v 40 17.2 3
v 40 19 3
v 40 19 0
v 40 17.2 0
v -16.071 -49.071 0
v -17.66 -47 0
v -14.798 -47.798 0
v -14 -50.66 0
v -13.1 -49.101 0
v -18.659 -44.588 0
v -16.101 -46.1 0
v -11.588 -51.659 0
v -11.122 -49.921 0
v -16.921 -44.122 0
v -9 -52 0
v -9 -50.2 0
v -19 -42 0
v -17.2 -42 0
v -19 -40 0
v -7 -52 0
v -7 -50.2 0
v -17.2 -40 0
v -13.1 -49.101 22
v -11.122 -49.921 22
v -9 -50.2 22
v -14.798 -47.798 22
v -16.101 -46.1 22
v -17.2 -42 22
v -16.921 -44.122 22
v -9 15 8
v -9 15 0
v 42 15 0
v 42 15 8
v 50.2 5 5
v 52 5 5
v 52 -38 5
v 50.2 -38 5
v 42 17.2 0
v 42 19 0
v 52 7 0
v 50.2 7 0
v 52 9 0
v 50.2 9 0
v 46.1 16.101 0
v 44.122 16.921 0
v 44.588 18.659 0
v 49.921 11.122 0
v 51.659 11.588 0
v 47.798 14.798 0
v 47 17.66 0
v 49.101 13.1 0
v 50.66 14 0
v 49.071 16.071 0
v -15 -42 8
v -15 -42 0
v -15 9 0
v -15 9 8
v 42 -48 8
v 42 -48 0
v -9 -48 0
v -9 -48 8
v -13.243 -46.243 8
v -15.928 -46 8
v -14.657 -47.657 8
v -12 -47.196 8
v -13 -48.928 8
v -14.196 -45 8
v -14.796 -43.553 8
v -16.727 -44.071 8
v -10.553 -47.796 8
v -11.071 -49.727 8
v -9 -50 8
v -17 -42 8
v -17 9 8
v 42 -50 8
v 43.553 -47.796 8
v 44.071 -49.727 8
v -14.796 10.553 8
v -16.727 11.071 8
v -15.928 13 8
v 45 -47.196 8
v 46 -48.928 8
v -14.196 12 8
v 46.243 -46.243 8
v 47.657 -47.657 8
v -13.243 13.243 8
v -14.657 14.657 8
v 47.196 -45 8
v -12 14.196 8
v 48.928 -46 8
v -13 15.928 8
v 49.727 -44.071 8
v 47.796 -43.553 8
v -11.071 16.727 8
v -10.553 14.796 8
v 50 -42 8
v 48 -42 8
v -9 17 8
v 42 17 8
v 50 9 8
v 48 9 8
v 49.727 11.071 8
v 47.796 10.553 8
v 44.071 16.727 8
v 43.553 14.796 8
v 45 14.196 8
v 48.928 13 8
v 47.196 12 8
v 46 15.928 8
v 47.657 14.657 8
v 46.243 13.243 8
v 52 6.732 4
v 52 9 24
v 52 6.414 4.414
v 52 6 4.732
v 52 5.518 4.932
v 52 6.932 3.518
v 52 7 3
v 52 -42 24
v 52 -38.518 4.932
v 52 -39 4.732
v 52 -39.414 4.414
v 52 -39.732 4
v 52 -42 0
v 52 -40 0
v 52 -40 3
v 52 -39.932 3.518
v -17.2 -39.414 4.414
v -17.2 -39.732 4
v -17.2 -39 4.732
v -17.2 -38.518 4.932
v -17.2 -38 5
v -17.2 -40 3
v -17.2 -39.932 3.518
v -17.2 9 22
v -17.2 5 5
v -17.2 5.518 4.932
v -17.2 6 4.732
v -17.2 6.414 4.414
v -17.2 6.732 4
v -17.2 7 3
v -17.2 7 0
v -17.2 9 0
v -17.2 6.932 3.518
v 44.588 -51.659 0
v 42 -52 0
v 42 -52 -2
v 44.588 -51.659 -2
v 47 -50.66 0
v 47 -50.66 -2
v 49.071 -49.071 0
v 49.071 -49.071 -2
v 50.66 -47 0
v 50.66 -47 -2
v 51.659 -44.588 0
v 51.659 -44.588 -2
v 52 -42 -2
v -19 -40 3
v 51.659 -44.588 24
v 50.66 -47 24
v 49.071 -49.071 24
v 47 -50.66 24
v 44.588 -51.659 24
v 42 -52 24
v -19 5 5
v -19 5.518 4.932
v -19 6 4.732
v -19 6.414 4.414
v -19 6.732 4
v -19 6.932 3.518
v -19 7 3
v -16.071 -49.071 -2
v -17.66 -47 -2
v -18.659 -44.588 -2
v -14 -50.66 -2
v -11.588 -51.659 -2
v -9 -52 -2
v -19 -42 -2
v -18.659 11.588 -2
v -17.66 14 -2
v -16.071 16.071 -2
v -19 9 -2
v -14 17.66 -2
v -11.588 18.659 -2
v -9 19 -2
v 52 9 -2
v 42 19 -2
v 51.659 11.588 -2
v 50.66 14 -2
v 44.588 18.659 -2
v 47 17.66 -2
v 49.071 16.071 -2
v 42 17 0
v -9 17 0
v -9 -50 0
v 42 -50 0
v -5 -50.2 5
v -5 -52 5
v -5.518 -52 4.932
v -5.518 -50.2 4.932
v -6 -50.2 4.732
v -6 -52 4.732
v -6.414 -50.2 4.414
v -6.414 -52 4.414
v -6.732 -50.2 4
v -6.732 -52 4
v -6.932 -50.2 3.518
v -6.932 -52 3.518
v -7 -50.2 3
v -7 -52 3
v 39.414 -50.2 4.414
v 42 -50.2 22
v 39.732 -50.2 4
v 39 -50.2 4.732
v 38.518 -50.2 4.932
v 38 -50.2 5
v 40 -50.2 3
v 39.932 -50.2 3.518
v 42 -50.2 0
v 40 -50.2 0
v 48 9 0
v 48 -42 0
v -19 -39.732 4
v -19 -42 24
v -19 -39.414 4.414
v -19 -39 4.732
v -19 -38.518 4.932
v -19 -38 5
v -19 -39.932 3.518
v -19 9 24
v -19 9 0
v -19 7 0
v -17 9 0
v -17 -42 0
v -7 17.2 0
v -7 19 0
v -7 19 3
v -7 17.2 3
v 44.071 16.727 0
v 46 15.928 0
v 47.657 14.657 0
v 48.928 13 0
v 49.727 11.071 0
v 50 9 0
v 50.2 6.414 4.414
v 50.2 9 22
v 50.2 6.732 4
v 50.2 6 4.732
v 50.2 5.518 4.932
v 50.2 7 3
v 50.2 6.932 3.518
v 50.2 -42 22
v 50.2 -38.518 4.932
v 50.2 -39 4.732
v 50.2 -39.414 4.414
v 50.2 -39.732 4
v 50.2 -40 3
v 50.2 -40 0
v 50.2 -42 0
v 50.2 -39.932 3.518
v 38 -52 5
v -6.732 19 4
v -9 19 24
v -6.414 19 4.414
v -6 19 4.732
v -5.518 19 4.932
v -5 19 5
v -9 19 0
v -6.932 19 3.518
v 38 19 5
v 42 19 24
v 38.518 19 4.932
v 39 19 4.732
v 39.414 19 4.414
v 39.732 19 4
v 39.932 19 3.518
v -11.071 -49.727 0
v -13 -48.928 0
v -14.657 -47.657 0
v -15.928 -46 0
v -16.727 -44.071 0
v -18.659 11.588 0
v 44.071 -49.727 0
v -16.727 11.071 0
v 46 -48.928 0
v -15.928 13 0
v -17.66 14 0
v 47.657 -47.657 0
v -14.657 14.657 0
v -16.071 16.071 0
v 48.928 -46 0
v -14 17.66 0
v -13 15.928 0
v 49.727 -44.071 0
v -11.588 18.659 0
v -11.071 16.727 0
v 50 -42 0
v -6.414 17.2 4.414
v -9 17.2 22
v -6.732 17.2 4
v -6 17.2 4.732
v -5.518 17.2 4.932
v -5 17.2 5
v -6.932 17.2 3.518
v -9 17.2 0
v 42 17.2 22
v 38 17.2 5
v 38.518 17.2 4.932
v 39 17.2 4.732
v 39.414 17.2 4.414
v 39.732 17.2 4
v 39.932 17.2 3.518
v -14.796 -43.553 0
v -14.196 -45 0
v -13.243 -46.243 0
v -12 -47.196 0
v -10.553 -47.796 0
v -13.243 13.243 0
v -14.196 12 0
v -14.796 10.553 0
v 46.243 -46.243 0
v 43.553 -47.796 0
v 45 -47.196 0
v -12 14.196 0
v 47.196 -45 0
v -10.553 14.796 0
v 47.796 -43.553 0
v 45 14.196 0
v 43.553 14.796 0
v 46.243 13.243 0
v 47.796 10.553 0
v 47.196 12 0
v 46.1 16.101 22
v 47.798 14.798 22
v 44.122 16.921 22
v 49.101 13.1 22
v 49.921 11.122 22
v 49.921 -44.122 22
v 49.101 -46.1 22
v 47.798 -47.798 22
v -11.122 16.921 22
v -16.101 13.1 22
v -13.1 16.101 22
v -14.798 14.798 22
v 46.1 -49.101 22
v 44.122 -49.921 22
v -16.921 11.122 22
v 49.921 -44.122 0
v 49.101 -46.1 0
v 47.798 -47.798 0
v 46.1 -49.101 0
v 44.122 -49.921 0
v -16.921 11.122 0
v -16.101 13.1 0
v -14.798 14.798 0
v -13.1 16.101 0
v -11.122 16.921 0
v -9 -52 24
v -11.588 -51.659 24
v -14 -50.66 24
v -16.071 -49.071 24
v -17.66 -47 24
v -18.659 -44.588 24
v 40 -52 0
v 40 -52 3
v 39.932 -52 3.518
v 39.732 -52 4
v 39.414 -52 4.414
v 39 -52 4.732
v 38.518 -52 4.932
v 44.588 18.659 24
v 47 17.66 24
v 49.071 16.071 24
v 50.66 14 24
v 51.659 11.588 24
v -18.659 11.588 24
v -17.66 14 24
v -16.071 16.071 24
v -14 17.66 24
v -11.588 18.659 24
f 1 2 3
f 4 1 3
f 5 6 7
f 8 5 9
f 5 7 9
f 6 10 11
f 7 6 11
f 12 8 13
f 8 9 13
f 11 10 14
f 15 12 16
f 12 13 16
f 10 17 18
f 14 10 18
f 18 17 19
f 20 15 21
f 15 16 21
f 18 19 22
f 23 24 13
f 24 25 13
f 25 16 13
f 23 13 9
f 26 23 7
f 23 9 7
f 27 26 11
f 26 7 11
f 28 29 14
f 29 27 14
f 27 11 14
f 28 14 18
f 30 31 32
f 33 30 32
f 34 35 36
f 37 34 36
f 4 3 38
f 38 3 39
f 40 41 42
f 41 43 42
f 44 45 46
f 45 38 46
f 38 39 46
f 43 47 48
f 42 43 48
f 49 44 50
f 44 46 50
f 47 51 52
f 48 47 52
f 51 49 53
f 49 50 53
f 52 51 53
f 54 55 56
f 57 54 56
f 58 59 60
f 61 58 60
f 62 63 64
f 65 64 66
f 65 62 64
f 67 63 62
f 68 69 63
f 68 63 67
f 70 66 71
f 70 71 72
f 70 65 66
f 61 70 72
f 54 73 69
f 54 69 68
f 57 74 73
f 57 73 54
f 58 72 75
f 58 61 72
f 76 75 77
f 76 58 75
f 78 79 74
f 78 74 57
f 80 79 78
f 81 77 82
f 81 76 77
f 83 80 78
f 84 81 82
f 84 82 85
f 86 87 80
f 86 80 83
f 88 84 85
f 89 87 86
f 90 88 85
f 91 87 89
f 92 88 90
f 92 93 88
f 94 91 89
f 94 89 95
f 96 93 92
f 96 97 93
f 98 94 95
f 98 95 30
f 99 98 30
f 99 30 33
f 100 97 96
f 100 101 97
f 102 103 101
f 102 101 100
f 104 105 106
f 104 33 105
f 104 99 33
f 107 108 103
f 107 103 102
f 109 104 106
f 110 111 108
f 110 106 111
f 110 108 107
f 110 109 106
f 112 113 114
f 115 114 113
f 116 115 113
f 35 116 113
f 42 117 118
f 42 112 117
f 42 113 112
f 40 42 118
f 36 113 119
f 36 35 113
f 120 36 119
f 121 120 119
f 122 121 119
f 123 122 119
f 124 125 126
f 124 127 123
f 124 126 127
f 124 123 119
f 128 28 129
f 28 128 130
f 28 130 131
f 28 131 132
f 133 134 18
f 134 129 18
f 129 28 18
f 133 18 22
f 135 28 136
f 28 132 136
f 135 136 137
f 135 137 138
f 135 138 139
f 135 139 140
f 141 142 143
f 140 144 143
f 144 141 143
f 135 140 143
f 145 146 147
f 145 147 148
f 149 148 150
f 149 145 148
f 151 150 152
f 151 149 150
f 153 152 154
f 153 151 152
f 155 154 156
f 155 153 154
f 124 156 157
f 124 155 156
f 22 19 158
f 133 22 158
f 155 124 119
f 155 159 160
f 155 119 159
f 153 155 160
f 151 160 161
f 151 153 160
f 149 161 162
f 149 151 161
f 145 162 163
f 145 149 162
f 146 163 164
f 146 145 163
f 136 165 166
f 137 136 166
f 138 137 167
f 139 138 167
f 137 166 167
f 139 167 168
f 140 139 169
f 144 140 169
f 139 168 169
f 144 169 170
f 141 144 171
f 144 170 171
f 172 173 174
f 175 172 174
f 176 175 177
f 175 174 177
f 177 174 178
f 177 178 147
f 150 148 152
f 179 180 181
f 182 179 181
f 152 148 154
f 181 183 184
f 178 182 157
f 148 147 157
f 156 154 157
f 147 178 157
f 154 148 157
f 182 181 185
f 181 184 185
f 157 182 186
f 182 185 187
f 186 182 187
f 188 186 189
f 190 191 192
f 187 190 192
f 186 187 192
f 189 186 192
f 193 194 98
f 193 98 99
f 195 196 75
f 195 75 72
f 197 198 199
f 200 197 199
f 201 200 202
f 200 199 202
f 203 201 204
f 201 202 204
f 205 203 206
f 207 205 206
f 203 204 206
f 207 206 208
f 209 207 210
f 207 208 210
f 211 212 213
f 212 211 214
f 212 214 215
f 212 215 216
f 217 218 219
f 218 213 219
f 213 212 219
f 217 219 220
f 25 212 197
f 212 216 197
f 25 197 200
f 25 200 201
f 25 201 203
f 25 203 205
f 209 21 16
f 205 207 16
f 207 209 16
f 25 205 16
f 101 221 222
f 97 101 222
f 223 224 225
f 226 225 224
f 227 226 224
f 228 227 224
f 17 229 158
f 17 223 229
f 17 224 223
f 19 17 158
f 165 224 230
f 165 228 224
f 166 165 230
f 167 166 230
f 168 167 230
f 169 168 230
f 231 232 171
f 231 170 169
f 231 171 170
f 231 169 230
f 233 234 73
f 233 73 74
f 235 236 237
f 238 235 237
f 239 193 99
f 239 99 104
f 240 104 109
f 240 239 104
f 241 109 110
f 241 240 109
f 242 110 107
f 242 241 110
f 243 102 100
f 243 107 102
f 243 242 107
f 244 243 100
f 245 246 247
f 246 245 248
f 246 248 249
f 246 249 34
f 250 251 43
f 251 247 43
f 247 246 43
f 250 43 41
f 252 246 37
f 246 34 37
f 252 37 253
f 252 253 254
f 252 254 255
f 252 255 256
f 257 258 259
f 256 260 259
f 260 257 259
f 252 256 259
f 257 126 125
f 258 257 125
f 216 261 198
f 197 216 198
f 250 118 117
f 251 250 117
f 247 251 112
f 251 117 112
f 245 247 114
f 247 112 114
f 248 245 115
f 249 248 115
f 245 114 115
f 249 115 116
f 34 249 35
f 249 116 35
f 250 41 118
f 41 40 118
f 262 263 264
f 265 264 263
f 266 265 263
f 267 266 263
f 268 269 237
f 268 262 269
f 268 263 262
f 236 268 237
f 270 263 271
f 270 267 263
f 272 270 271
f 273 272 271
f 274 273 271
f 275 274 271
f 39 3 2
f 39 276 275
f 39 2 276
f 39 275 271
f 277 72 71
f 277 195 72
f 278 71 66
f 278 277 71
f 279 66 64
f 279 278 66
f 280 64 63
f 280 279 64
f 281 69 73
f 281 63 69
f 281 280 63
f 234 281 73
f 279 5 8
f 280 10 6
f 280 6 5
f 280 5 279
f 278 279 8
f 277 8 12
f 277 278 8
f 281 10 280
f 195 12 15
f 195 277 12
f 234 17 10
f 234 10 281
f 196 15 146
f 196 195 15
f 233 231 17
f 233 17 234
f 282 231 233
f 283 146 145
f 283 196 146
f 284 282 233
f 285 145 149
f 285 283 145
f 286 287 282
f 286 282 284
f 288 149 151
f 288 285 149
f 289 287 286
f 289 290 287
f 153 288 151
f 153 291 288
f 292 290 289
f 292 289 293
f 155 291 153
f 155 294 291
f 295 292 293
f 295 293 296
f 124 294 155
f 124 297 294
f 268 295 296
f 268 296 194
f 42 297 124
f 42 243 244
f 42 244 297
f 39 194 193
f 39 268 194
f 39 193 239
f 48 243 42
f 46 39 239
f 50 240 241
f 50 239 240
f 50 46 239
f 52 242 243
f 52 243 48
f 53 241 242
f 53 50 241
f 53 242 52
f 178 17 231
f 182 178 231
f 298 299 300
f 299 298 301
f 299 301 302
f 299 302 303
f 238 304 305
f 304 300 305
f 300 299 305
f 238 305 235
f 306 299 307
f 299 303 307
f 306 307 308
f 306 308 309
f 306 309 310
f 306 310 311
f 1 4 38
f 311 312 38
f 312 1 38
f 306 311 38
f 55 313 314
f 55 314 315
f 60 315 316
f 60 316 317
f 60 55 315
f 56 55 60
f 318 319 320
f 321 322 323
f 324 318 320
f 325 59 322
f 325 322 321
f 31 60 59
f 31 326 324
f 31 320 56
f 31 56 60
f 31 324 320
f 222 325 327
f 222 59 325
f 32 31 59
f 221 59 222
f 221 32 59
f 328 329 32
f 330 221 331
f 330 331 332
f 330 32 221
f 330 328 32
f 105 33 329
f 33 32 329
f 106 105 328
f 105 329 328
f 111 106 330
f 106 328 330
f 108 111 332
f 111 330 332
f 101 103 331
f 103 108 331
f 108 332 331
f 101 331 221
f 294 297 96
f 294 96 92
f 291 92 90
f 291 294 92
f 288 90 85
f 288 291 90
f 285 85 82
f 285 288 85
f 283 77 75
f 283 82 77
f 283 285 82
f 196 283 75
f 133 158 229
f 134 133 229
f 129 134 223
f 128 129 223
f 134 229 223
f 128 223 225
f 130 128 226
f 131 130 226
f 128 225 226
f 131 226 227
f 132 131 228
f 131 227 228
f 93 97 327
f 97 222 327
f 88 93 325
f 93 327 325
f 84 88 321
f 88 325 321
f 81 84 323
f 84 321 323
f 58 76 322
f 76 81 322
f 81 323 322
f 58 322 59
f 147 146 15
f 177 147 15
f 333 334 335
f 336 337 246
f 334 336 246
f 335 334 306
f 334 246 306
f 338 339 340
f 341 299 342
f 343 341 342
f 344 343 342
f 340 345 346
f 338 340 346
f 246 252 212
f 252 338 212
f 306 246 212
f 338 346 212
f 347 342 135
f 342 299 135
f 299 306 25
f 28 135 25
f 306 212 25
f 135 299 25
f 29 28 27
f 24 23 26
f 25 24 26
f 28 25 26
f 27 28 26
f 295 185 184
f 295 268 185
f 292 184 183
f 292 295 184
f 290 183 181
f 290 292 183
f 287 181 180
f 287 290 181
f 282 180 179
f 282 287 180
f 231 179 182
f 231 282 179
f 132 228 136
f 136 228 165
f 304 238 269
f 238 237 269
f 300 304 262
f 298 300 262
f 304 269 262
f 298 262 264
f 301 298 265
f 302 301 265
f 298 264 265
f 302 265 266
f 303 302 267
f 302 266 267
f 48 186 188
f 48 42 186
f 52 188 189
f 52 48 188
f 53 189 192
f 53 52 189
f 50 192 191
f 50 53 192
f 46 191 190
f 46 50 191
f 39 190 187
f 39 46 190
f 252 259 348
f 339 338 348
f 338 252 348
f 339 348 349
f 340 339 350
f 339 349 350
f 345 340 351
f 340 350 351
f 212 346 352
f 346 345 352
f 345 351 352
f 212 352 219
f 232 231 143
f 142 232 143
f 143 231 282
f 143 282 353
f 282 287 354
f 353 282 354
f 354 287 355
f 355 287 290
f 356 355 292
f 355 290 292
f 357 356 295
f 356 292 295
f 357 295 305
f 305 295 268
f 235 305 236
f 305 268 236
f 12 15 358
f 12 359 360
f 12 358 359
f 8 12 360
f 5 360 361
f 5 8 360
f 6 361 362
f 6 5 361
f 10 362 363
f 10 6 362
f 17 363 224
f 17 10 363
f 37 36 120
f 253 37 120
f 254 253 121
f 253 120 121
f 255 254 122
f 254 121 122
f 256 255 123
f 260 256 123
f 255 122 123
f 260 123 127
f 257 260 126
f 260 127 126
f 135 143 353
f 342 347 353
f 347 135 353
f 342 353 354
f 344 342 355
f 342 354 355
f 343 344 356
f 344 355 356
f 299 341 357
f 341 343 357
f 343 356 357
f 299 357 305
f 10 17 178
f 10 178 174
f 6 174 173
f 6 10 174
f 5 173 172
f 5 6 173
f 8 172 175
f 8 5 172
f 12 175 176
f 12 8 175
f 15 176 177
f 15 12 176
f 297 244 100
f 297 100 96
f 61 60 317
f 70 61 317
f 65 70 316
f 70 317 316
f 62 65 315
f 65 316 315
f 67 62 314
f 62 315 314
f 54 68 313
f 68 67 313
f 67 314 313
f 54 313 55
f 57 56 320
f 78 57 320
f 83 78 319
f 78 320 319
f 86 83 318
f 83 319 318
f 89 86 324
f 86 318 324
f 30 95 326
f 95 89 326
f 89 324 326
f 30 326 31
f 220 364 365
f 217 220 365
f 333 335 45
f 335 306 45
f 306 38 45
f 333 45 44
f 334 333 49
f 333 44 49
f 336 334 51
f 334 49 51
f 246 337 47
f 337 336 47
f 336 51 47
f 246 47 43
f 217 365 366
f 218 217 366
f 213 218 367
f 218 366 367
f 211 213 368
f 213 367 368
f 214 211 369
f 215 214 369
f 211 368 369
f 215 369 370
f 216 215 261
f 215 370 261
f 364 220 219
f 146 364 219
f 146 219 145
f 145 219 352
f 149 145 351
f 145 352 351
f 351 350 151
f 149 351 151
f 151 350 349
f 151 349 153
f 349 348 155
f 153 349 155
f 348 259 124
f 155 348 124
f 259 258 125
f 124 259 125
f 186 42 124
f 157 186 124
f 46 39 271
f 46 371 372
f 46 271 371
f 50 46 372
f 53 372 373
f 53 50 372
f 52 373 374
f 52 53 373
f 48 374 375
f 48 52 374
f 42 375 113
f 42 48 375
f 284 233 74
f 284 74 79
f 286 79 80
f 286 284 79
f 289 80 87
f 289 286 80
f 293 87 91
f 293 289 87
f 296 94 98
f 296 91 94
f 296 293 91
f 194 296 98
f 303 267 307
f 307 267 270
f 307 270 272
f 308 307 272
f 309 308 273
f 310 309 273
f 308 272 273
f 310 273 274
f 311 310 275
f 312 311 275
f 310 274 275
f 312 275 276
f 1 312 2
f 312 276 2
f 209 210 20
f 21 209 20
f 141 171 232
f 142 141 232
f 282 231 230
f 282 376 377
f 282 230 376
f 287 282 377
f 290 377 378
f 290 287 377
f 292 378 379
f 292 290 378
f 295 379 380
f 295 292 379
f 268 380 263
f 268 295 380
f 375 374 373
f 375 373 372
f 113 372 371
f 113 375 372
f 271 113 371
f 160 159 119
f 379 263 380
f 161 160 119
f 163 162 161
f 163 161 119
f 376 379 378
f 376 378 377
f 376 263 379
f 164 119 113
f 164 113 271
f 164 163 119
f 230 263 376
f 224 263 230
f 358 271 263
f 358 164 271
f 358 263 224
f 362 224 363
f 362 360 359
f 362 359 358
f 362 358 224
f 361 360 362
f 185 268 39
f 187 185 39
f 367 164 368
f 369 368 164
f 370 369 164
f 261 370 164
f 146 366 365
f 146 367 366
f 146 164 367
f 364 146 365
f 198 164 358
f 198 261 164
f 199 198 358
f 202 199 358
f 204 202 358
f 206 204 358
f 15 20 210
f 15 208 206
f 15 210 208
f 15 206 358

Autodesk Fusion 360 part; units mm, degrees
sketch "Sketch1" plane through (0, 0, 0) normal (0, 0, 1) x (1, 0, 0)
  line L0 (-9, 15) -> (42, 15)
  line L1 (48, 9) -> (48, -42)
  line L2 (42, -48) -> (-9, -48)
  line L3 (-15, -42) -> (-15, 9)
  arc A0 (-9, 15) -> (-15, 9) centre (-9, 9) ccw
  arc A1 (48, 9) -> (42, 15) centre (42, 9) ccw
  arc A2 (42, -48) -> (48, -42) centre (42, -42) ccw
  arc A3 (-15, -42) -> (-9, -48) centre (-9, -42) ccw
  arc A4 (-9, 17) -> (-17, 9) centre (-9, 9) ccw
  line L4 (-17, -42) -> (-17, 9)
  arc A5 (-17, -42) -> (-9, -50) centre (-9, -42) ccw
  line L5 (42, -50) -> (-9, -50)
  arc A6 (42, -50) -> (50, -42) centre (42, -42) ccw
  line L6 (50, 9) -> (50, -42)
  arc A7 (50, 9) -> (42, 17) centre (42, 9) ccw
  line L7 (-9, 17) -> (42, 17)
  arc A8 (-9, 19) -> (-19, 9) centre (-9, 9) ccw
  line L8 (-19, -42) -> (-19, 9)
  arc A9 (-19, -42) -> (-9, -52) centre (-9, -42) ccw
  line L9 (42, -52) -> (-9, -52)
  arc A10 (42, -52) -> (52, -42) centre (42, -42) ccw
  line L10 (52, 9) -> (52, -42)
  arc A11 (52, 9) -> (42, 19) centre (42, 9) ccw
  line L11 (-9, 19) -> (42, 19)
  arc A12 (50.2, 9) -> (42, 17.2) centre (42, 9) ccw
  line L12 (-9, 17.2) -> (42, 17.2)
  arc A13 (-9, 17.2) -> (-17.2, 9) centre (-9, 9) ccw
  line L13 (-17.2, -42) -> (-17.2, 9)
  arc A14 (-17.2, -42) -> (-9, -50.2) centre (-9, -42) ccw
  line L14 (42, -50.2) -> (-9, -50.2)
  arc A15 (42, -50.2) -> (50.2, -42) centre (42, -42) ccw
  line L15 (50.2, 9) -> (50.2, -42)
  point P0 (-15, 15)
  point P1 (48, 15)
  point P2 (-15, -48)
  dimension "d1" = 63
  dimension "d2" = 63
  dimension "d3" = 6
  dimension "d4" = -2
  dimension "d5" = -4
  dimension "d10" = -2.2
extrude "Extrude1" add sketch "Sketch1" along normal blind 8 contours A4 L4 A5 L5 A6 L6 A7 L7 makes body 1
extrude "Extrude2" add sketch "Sketch1" against normal blind 2 contours L0 L1 L2 L3 A0 A1 A2 A3 | A4 L4 A5 L5 A6 L6 A7 L7 | A8 L8 A9 L9 A10 L10 A11 L11 | A12 L12 A13 L13 A14 L14 A15 L15 bodies 1
extrude "Extrude1'" add sketch "Sketch1" along normal blind 22 separate body contours A8 L8 A9 L9 A10 L10 A11 L11 makes body 2 in component "Component"
sketch "Sketch2" plane through (0, 0, 22) normal (0, 0, 1) x (-1, 0, 0)
  arc A0 (9, -17.2) -> (17.2, -9) centre (9, -9) ccw
  line L0 (9, -17.2) -> (-42, -17.2)
  arc A1 (-50.2, -9) -> (-42, -17.2) centre (-42, -9) ccw
  line L1 (-50.2, -9) -> (-50.2, 42)
  arc A2 (-42, 50.2) -> (-50.2, 42) centre (-42, 42) ccw
  line L2 (-42, 50.2) -> (9, 50.2)
  arc A3 (17.2, 42) -> (9, 50.2) centre (9, 42) ccw
  line L3 (17.2, 42) -> (17.2, -9)
  arc A4 (19, 42) -> (9, 52) centre (9, 42) ccw
  line L4 (9, 52) -> (-42, 52)
  arc A5 (-42, 52) -> (-52, 42) centre (-42, 42) ccw
  line L5 (-52, 42) -> (-52, -9)
  arc A6 (-52, -9) -> (-42, -19) centre (-42, -9) ccw
  line L6 (-42, -19) -> (9, -19)
  arc A7 (9, -19) -> (19, -9) centre (9, -9) ccw
  line L7 (19, -9) -> (19, 42)
  line L8 (-24.5335, -19) -> (25, -19) construction
  line L9 (19, -5.9098) -> (19, -23.1941) construction
  line L10 (-52, 36.1857) -> (-52, 61.8333) construction
  line L11 (-39.3087, 52) -> (-56.3142, 52) construction
  line L12 (9, -19) -> (-42, -19)
  line L13 (-52, -9) -> (-52, 42)
  line L14 (-42, 52) -> (9, 52)
  line L15 (19, 42) -> (19, -9)
  arc A8 (9, -19) -> (19, -9) centre (9, -9) ccw
  arc A9 (-52, -9) -> (-42, -19) centre (-42, -9) ccw
  arc A10 (-42, 52) -> (-52, 42) centre (-42, 42) ccw
  arc A11 (19, 42) -> (9, 52) centre (9, 42) ccw
  dimension "d13" = 10
extrude "Extrude2'" add sketch "Sketch2" along normal blind 2 contours A0 L0 A1 L1 A2 L2 A3 L3 | A4 L4 A5 L5 A6 L6 A7 L7 L12 L13 L14 L15 A8 A9 A10 A11 bodies 2 in component "Component"
sketch "Sketch3" plane through (52, 0, 0) normal (1, 0, 0) x (0, 1, 0)
  line L0 (-42, 0) -> (9, 0)
  line L1 (9, 0) -> (9, 24)
  line L2 (9, 24) -> (-42, 24)
  line L3 (-42, 24) -> (-42, 0)
  line L4 (-40, 0) -> (7, 0)
  line L5 (7, 0) -> (7, 3)
  line L6 (5, 5) -> (-38, 5)
  line L7 (-40, 3) -> (-40, 0)
  arc A0 (-38, 5) -> (-40, 3) centre (-38, 3) ccw
  arc A1 (7, 3) -> (5, 5) centre (5, 3) ccw
  dimension "d16" = 2
extrude "Extrude3" cut sketch "Sketch3" against normal blind 2 contours L0 L4 L5 L6 L7 A0 A1 bodies 2 in component "Component"
sketch "Sketch4" plane through (0, -52, 0) normal (0, -1, 0) x (1, 0, 0)
  line L0 (-9, 0) -> (42, 0)
  line L1 (42, 0) -> (42, 24)
  line L2 (42, 24) -> (-9, 24)
  line L3 (-9, 24) -> (-9, 0)
  line L4 (-7, 0) -> (40, 0)
  line L5 (40, 0) -> (40, 3)
  line L6 (38, 5) -> (-5, 5)
  line L7 (-7, 3) -> (-7, 0)
  arc A0 (-5, 5) -> (-7, 3) centre (-5, 3) ccw
  arc A1 (40, 3) -> (38, 5) centre (38, 3) ccw
  dimension "d19" = 2
extrude "Extrude4" cut sketch "Sketch4" against normal blind 2 contours L0 L4 L5 L6 L7 A0 A1 bodies 2 in component "Component"
sketch "Sketch5" plane through (0, 19, 0) normal (0, 1, 0) x (-1, 0, 0)
  line L0 (-42, 0) -> (9, 0)
  line L1 (9, 0) -> (9, 24)
  line L2 (9, 24) -> (-42, 24)
  line L3 (-42, 24) -> (-42, 0)
  line L4 (-40, 0) -> (7, 0)
  line L5 (7, 0) -> (7, 3)
  line L6 (5, 5) -> (-38, 5)
  line L7 (-40, 3) -> (-40, 0)
  arc A0 (-38, 5) -> (-40, 3) centre (-38, 3) ccw
  arc A1 (7, 3) -> (5, 5) centre (5, 3) ccw
  dimension "d22" = 2
extrude "Extrude5" cut sketch "Sketch5" against normal blind 2 contours L0 L4 L5 L6 L7 A0 A1 bodies 2 in component "Component"
sketch "Sketch6" plane through (-19, 0, 0) normal (-1, 0, 0) x (0, -1, 0)
  line L0 (-9, 0) -> (42, 0)
  line L1 (42, 0) -> (42, 24)
  line L2 (42, 24) -> (-9, 24)
  line L3 (-9, 24) -> (-9, 0)
  line L4 (-7, 0) -> (40, 0)
  line L5 (40, 0) -> (40, 3)
  line L6 (38, 5) -> (-5, 5)
  line L7 (-7, 3) -> (-7, 0)
  arc A0 (-5, 5) -> (-7, 3) centre (-5, 3) ccw
  arc A1 (40, 3) -> (38, 5) centre (38, 3) ccw
  dimension "d25" = 47
  dimension "d26" = 2
extrude "Extrude6" cut sketch "Sketch6" against normal blind 2 contours L0 L4 L5 L6 L7 A0 A1 bodies 2 in component "Component"
component "Component" placed x (1, 0, 0) y (0, 1, 0) z (0, 0, 1) at (0, 0, 0)
